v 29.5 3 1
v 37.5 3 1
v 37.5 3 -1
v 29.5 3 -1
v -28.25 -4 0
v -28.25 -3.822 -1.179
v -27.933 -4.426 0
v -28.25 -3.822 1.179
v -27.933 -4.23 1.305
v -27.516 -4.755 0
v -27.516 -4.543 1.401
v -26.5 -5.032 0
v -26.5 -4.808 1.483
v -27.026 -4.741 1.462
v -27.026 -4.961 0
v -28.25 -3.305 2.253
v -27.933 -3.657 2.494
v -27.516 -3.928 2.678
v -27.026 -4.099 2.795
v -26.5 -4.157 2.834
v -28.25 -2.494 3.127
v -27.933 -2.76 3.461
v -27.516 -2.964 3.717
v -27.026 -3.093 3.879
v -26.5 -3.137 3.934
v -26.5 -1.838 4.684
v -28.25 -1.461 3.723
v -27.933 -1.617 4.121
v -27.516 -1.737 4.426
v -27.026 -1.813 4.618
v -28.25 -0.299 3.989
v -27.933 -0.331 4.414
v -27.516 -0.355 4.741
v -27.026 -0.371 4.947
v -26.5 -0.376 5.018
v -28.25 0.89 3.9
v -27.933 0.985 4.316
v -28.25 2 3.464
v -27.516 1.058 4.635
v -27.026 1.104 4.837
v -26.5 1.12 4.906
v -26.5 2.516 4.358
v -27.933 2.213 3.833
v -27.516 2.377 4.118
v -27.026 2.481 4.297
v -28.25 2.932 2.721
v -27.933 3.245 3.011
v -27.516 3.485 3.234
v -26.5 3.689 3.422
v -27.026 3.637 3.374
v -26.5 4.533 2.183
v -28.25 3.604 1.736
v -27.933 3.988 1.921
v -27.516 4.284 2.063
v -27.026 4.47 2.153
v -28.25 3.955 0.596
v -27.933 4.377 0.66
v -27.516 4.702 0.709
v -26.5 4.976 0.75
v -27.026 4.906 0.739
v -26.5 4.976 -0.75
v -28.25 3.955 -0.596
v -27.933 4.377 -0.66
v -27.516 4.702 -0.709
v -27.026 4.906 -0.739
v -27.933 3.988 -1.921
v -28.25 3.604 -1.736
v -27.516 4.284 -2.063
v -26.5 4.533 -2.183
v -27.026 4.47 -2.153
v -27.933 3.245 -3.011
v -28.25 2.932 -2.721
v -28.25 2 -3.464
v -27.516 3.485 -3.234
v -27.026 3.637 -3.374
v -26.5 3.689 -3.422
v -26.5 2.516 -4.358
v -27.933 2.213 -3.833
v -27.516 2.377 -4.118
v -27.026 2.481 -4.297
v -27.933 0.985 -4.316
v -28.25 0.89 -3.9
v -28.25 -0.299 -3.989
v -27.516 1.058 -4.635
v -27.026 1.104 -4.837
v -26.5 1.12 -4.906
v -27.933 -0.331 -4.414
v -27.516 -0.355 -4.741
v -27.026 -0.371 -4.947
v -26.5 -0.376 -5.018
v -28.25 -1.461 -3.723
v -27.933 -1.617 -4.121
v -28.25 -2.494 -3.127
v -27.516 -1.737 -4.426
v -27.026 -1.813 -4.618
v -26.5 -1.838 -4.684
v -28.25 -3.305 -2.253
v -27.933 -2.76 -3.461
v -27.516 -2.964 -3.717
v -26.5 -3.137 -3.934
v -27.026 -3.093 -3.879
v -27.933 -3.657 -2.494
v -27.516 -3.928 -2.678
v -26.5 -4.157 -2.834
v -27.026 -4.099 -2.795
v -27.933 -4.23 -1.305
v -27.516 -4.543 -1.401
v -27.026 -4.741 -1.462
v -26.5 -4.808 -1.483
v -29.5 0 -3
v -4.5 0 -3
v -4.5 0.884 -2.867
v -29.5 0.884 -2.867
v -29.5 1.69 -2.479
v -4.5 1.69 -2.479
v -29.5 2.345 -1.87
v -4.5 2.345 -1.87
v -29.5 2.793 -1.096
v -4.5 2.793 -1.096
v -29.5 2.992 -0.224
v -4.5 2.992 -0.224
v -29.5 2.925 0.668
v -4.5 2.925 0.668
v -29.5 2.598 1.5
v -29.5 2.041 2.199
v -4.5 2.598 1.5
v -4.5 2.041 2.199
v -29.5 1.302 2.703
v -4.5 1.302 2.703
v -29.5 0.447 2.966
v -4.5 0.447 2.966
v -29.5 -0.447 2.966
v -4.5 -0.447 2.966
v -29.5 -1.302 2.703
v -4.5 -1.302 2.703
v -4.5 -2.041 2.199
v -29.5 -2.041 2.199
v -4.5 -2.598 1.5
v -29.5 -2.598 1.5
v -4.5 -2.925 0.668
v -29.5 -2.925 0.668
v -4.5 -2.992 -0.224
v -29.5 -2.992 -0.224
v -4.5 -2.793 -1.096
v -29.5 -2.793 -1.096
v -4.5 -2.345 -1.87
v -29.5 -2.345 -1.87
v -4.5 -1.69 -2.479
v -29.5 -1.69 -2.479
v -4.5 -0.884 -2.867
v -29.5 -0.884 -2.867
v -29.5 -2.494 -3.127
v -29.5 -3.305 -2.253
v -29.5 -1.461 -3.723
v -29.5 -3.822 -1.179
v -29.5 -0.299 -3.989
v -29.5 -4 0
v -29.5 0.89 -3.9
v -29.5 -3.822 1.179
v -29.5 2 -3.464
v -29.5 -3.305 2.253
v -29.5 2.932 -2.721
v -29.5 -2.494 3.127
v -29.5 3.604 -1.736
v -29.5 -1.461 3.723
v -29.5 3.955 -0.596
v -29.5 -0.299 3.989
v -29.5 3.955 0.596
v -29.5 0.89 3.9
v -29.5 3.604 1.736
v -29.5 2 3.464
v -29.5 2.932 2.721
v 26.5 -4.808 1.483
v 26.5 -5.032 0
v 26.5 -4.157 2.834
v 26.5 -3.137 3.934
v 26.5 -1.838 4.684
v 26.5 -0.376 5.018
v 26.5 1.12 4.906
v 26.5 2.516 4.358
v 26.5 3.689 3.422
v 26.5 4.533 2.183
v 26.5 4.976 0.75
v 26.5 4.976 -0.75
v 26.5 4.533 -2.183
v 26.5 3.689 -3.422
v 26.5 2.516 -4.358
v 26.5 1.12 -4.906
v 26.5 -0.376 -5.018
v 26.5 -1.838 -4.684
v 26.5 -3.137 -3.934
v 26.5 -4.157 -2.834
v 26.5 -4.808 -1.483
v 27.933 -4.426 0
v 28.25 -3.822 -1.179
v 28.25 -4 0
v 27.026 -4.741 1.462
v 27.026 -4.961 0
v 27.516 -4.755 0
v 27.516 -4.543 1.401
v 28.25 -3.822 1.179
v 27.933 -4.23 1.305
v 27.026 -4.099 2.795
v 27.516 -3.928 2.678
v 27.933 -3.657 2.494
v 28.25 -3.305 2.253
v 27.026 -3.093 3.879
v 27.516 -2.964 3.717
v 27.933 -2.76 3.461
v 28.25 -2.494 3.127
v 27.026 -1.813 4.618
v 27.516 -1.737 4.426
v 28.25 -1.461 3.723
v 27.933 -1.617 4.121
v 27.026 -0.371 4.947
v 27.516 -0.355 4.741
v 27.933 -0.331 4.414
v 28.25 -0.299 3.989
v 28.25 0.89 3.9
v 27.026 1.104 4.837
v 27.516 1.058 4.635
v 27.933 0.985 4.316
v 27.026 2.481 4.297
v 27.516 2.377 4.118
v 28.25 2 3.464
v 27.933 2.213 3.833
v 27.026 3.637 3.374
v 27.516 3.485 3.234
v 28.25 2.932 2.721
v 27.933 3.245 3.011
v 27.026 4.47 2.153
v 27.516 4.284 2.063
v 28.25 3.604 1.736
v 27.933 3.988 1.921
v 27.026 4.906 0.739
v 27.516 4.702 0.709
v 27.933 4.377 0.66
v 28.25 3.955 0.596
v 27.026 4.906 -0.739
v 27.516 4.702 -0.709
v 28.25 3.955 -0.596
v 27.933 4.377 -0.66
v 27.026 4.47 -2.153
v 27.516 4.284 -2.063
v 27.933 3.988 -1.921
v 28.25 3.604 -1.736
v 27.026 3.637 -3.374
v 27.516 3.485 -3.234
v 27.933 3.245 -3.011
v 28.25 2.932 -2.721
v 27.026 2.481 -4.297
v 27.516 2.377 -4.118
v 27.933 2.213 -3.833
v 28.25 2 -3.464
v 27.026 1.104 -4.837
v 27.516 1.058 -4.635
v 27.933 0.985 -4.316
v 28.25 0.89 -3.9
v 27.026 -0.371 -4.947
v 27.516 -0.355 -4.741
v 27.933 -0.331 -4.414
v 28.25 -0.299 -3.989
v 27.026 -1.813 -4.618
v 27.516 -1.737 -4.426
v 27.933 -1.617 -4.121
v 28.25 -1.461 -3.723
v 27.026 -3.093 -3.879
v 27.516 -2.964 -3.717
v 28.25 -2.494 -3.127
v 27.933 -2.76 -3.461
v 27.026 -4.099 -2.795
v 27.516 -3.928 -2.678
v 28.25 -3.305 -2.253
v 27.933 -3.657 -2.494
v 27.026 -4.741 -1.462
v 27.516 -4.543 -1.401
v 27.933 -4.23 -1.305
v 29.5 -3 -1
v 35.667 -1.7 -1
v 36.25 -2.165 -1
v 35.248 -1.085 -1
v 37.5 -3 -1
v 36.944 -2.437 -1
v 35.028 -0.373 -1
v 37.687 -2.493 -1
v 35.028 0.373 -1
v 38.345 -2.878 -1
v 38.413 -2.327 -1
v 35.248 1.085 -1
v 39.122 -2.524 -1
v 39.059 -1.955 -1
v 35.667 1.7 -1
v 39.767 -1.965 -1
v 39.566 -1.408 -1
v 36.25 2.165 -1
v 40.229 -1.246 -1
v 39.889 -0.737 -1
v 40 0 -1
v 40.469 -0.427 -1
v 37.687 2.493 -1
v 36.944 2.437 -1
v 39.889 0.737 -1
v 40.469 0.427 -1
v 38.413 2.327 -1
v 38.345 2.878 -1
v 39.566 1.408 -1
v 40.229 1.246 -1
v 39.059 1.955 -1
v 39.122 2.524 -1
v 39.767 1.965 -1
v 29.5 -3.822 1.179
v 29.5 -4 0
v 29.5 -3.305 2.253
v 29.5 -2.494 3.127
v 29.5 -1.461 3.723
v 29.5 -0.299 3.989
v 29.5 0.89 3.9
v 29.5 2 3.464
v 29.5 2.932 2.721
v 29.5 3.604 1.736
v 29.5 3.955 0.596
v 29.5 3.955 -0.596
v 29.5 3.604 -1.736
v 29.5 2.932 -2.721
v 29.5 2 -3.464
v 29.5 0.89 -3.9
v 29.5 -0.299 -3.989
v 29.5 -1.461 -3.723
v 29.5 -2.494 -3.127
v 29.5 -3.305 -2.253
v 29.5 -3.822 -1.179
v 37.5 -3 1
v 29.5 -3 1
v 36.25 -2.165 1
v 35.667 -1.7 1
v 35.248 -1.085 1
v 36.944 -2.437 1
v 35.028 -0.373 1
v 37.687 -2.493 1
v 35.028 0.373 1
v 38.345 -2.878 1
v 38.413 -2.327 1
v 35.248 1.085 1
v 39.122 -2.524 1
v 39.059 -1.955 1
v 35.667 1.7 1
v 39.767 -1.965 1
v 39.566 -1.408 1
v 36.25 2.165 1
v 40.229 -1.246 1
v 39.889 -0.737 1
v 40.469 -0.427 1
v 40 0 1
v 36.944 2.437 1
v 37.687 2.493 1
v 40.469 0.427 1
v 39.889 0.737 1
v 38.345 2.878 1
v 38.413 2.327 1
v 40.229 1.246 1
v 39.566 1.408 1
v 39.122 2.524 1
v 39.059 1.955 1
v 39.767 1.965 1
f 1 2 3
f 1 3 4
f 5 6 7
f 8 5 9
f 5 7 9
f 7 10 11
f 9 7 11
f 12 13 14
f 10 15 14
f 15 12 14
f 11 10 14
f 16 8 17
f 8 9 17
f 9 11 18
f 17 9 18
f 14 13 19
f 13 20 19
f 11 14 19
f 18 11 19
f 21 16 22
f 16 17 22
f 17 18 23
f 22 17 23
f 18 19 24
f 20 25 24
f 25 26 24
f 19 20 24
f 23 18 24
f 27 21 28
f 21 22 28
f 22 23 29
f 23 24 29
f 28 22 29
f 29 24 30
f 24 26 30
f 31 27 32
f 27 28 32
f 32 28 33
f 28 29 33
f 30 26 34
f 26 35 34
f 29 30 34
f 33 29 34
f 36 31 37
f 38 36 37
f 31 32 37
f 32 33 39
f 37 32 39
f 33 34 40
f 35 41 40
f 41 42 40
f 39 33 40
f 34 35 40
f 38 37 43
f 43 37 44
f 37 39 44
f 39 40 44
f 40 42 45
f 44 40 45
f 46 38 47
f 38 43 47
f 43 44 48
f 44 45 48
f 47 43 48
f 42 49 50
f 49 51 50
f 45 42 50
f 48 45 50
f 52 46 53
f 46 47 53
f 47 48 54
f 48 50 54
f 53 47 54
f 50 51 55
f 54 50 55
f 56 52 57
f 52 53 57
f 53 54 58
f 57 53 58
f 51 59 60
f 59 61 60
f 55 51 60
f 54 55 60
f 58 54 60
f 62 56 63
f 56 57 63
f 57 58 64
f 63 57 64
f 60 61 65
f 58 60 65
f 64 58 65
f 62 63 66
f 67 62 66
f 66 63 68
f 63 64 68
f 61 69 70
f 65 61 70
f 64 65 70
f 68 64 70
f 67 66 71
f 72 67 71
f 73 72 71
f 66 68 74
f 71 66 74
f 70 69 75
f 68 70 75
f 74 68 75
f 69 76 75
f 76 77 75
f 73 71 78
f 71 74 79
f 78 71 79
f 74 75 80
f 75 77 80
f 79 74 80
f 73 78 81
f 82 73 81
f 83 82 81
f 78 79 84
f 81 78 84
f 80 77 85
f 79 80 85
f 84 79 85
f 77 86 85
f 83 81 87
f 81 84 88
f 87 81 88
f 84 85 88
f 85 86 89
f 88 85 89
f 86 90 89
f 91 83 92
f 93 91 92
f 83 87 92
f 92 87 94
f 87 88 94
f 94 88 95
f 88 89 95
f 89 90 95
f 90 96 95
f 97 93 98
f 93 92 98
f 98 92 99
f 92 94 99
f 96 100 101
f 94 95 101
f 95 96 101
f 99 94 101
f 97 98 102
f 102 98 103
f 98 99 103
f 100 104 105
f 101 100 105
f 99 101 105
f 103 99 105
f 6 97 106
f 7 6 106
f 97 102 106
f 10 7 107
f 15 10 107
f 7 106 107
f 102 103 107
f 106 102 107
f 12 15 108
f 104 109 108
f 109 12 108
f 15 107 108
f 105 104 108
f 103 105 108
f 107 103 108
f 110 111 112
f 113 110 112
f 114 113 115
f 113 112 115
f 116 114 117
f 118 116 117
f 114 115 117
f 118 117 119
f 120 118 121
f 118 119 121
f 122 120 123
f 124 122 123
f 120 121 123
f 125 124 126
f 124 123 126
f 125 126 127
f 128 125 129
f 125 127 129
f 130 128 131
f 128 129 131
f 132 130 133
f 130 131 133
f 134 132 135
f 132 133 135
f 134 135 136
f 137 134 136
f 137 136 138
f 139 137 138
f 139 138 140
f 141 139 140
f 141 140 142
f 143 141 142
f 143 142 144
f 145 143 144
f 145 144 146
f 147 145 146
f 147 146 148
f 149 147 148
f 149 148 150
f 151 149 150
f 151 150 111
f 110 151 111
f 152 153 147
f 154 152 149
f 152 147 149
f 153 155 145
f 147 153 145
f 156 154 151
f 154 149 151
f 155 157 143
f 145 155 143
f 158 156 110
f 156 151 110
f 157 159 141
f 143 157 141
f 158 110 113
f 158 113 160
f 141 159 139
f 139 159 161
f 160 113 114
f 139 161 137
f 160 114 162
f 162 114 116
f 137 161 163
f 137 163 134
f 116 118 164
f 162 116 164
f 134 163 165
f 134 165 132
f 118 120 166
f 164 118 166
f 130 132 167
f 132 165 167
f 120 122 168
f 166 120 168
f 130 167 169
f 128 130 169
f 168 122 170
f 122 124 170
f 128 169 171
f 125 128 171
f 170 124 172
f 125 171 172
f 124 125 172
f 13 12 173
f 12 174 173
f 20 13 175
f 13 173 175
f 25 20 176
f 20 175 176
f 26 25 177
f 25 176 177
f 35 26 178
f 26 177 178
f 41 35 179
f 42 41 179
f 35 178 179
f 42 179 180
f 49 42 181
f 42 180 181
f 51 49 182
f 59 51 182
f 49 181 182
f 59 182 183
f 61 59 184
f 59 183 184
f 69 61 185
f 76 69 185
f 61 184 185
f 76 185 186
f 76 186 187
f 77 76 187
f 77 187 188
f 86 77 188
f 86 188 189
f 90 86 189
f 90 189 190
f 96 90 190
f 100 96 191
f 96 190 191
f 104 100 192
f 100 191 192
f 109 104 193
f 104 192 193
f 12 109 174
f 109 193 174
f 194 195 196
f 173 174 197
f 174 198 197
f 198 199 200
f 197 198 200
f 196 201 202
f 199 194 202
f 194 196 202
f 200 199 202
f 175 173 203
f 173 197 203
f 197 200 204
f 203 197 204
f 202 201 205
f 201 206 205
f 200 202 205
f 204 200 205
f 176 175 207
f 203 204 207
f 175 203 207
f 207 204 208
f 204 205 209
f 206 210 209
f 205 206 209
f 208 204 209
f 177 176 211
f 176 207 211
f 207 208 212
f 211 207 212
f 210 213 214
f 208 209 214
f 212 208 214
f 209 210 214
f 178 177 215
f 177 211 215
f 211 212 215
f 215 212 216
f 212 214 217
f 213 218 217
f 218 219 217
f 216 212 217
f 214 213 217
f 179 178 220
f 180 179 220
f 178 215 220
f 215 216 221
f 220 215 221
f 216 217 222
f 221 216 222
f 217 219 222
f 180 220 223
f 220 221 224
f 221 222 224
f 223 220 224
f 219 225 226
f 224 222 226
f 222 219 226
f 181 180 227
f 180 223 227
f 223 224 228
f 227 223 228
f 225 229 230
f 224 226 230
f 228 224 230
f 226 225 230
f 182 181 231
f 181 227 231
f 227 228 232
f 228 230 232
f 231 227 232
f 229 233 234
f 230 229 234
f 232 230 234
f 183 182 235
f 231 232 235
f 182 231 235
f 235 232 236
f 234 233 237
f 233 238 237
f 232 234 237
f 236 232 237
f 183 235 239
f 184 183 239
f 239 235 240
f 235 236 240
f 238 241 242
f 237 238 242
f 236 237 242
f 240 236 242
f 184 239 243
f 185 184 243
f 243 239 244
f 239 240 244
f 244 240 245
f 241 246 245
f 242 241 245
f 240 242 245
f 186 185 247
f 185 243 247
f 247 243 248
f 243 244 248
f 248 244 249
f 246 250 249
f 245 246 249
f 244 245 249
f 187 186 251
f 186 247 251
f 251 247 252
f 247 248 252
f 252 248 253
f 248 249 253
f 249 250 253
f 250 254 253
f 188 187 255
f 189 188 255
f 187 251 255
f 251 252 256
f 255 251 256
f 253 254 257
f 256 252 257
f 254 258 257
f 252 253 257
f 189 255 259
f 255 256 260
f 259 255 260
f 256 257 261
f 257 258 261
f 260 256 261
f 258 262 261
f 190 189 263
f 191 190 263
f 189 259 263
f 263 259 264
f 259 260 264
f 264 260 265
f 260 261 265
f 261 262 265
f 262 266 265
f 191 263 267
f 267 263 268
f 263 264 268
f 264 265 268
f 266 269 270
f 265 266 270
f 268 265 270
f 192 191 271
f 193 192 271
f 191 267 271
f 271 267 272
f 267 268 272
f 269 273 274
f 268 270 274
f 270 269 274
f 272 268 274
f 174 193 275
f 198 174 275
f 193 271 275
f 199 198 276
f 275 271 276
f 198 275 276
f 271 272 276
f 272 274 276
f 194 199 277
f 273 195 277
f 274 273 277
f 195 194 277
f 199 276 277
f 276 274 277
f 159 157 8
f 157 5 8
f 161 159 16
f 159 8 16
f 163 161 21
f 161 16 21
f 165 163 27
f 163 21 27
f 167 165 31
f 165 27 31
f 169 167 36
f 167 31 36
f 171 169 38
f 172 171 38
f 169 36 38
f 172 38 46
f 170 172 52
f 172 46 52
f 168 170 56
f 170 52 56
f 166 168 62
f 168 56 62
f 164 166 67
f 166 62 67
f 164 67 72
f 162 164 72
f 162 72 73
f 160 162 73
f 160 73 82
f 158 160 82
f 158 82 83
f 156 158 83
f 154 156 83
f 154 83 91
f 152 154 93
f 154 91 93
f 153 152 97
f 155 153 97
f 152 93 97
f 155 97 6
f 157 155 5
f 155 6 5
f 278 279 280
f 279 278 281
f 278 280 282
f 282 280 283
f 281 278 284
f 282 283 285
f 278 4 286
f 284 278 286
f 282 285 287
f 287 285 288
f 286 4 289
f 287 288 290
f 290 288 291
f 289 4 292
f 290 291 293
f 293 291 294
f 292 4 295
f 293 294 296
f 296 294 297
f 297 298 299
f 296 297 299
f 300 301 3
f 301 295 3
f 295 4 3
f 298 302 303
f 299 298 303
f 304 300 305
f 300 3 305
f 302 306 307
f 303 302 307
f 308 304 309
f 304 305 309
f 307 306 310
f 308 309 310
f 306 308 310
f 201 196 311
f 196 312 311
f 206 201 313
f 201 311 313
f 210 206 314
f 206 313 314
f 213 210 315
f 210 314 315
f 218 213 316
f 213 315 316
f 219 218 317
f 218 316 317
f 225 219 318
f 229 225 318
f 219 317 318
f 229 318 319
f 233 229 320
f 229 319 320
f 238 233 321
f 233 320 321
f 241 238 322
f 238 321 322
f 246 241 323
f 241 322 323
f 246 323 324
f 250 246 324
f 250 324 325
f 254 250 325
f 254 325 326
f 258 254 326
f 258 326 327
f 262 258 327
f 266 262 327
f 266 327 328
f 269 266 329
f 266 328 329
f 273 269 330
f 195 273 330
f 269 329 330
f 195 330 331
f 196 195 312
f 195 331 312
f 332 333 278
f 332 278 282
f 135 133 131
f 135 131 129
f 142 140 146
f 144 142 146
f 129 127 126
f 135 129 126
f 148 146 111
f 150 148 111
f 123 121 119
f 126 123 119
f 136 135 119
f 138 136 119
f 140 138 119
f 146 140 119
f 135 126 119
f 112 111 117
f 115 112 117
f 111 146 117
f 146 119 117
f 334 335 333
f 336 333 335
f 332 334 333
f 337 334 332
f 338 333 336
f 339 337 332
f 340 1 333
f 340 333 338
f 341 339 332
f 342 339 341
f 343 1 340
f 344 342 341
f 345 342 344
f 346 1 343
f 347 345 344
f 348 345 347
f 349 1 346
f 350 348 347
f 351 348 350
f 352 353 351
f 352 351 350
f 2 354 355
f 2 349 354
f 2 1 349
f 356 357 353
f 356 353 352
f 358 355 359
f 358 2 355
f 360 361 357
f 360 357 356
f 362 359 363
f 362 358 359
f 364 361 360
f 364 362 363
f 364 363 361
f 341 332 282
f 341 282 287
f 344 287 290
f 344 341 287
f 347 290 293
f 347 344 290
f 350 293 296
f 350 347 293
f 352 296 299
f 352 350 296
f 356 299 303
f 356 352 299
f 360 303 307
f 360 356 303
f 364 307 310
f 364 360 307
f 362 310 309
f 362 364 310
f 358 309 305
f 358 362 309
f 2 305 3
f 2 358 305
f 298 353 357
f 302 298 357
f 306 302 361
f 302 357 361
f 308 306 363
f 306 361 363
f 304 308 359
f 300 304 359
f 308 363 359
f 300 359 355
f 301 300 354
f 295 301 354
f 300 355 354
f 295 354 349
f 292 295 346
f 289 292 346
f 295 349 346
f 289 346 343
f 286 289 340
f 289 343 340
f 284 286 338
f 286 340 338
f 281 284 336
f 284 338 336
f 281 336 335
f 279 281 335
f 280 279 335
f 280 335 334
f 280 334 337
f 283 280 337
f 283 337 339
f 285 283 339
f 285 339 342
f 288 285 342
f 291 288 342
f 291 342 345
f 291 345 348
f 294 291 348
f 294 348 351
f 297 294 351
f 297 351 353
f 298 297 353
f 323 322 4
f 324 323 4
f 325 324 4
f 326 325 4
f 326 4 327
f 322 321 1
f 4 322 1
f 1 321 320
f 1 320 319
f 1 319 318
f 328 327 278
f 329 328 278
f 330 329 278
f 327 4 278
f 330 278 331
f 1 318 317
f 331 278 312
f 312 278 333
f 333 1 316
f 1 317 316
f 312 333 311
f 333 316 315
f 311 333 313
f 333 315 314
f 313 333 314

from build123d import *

# Parameters (mm, degrees)
BOSS_EXTRUDE1_DEPTH          = 2
F_6_0_6_DIAMETER_HOLE1_D     = 6
F_6_0_6_DIAMETER_HOLE1_DEPTH = 25
F_5_0_5_DIAMETER_HOLE1_D     = 5
F_5_0_5_DIAMETER_HOLE1_DEPTH = 6.031754163


with BuildPart() as part:
    # Sketch1 → Revolve1 (revolve)
    with BuildSketch(Plane(origin=(0, 0, 0), x_dir=(-1, 0, 0), z_dir=(0, 0, -1))):
        with BuildLine():
            Line((-29.5, 4), (-29.5, 0))
            Line((-29.5, 0), (29.5, 0))
            Line((29.5, 0), (29.5, 4))
            Line((29.5, 4), (28.25, 4))
            ThreePointArc((28.25, 4), (27.515753003, 4.754613948), (26.5, 5.031754163))
            Line((26.5, 5.031754163), (-26.5, 5.031754163))
            ThreePointArc((-26.5, 5.031754163), (-27.515753003, 4.754613948), (-28.25, 4))
            Line((-28.25, 4), (-29.5, 4))
        make_face()
    revolve(axis=Axis((29.5, 0, 0), (-1, 0, 0)))

    # Sketch2 → Boss-Extrude1 (add)
    with BuildSketch(Plane.XY.offset(1)):
        with BuildLine():
            Line((37.5, 3), (29.5, 3))
            Line((29.5, 3), (29.5, -3))
            Line((29.5, -3), (37.5, -3))
            ThreePointArc((37.5, -3), (40.5, 0), (37.5, 3))
        make_face()
    extrude(amount=-BOSS_EXTRUDE1_DEPTH)

    # Ø6.0 (6) Diameter Hole1
    with Locations(Plane.ZY.offset(29.5)):
        with Locations((0, 0)):
            Hole(F_6_0_6_DIAMETER_HOLE1_D / 2, depth=F_6_0_6_DIAMETER_HOLE1_DEPTH)

    # Ø5.0 (5) Diameter Hole1
    with Locations(Plane(origin=(0, 0, -1), x_dir=(-1, 0, 0), z_dir=(0, 0, -1))):
        with Locations((-37.5, 0)):
            Hole(F_5_0_5_DIAMETER_HOLE1_D / 2, depth=F_5_0_5_DIAMETER_HOLE1_DEPTH)


solid = part.part
